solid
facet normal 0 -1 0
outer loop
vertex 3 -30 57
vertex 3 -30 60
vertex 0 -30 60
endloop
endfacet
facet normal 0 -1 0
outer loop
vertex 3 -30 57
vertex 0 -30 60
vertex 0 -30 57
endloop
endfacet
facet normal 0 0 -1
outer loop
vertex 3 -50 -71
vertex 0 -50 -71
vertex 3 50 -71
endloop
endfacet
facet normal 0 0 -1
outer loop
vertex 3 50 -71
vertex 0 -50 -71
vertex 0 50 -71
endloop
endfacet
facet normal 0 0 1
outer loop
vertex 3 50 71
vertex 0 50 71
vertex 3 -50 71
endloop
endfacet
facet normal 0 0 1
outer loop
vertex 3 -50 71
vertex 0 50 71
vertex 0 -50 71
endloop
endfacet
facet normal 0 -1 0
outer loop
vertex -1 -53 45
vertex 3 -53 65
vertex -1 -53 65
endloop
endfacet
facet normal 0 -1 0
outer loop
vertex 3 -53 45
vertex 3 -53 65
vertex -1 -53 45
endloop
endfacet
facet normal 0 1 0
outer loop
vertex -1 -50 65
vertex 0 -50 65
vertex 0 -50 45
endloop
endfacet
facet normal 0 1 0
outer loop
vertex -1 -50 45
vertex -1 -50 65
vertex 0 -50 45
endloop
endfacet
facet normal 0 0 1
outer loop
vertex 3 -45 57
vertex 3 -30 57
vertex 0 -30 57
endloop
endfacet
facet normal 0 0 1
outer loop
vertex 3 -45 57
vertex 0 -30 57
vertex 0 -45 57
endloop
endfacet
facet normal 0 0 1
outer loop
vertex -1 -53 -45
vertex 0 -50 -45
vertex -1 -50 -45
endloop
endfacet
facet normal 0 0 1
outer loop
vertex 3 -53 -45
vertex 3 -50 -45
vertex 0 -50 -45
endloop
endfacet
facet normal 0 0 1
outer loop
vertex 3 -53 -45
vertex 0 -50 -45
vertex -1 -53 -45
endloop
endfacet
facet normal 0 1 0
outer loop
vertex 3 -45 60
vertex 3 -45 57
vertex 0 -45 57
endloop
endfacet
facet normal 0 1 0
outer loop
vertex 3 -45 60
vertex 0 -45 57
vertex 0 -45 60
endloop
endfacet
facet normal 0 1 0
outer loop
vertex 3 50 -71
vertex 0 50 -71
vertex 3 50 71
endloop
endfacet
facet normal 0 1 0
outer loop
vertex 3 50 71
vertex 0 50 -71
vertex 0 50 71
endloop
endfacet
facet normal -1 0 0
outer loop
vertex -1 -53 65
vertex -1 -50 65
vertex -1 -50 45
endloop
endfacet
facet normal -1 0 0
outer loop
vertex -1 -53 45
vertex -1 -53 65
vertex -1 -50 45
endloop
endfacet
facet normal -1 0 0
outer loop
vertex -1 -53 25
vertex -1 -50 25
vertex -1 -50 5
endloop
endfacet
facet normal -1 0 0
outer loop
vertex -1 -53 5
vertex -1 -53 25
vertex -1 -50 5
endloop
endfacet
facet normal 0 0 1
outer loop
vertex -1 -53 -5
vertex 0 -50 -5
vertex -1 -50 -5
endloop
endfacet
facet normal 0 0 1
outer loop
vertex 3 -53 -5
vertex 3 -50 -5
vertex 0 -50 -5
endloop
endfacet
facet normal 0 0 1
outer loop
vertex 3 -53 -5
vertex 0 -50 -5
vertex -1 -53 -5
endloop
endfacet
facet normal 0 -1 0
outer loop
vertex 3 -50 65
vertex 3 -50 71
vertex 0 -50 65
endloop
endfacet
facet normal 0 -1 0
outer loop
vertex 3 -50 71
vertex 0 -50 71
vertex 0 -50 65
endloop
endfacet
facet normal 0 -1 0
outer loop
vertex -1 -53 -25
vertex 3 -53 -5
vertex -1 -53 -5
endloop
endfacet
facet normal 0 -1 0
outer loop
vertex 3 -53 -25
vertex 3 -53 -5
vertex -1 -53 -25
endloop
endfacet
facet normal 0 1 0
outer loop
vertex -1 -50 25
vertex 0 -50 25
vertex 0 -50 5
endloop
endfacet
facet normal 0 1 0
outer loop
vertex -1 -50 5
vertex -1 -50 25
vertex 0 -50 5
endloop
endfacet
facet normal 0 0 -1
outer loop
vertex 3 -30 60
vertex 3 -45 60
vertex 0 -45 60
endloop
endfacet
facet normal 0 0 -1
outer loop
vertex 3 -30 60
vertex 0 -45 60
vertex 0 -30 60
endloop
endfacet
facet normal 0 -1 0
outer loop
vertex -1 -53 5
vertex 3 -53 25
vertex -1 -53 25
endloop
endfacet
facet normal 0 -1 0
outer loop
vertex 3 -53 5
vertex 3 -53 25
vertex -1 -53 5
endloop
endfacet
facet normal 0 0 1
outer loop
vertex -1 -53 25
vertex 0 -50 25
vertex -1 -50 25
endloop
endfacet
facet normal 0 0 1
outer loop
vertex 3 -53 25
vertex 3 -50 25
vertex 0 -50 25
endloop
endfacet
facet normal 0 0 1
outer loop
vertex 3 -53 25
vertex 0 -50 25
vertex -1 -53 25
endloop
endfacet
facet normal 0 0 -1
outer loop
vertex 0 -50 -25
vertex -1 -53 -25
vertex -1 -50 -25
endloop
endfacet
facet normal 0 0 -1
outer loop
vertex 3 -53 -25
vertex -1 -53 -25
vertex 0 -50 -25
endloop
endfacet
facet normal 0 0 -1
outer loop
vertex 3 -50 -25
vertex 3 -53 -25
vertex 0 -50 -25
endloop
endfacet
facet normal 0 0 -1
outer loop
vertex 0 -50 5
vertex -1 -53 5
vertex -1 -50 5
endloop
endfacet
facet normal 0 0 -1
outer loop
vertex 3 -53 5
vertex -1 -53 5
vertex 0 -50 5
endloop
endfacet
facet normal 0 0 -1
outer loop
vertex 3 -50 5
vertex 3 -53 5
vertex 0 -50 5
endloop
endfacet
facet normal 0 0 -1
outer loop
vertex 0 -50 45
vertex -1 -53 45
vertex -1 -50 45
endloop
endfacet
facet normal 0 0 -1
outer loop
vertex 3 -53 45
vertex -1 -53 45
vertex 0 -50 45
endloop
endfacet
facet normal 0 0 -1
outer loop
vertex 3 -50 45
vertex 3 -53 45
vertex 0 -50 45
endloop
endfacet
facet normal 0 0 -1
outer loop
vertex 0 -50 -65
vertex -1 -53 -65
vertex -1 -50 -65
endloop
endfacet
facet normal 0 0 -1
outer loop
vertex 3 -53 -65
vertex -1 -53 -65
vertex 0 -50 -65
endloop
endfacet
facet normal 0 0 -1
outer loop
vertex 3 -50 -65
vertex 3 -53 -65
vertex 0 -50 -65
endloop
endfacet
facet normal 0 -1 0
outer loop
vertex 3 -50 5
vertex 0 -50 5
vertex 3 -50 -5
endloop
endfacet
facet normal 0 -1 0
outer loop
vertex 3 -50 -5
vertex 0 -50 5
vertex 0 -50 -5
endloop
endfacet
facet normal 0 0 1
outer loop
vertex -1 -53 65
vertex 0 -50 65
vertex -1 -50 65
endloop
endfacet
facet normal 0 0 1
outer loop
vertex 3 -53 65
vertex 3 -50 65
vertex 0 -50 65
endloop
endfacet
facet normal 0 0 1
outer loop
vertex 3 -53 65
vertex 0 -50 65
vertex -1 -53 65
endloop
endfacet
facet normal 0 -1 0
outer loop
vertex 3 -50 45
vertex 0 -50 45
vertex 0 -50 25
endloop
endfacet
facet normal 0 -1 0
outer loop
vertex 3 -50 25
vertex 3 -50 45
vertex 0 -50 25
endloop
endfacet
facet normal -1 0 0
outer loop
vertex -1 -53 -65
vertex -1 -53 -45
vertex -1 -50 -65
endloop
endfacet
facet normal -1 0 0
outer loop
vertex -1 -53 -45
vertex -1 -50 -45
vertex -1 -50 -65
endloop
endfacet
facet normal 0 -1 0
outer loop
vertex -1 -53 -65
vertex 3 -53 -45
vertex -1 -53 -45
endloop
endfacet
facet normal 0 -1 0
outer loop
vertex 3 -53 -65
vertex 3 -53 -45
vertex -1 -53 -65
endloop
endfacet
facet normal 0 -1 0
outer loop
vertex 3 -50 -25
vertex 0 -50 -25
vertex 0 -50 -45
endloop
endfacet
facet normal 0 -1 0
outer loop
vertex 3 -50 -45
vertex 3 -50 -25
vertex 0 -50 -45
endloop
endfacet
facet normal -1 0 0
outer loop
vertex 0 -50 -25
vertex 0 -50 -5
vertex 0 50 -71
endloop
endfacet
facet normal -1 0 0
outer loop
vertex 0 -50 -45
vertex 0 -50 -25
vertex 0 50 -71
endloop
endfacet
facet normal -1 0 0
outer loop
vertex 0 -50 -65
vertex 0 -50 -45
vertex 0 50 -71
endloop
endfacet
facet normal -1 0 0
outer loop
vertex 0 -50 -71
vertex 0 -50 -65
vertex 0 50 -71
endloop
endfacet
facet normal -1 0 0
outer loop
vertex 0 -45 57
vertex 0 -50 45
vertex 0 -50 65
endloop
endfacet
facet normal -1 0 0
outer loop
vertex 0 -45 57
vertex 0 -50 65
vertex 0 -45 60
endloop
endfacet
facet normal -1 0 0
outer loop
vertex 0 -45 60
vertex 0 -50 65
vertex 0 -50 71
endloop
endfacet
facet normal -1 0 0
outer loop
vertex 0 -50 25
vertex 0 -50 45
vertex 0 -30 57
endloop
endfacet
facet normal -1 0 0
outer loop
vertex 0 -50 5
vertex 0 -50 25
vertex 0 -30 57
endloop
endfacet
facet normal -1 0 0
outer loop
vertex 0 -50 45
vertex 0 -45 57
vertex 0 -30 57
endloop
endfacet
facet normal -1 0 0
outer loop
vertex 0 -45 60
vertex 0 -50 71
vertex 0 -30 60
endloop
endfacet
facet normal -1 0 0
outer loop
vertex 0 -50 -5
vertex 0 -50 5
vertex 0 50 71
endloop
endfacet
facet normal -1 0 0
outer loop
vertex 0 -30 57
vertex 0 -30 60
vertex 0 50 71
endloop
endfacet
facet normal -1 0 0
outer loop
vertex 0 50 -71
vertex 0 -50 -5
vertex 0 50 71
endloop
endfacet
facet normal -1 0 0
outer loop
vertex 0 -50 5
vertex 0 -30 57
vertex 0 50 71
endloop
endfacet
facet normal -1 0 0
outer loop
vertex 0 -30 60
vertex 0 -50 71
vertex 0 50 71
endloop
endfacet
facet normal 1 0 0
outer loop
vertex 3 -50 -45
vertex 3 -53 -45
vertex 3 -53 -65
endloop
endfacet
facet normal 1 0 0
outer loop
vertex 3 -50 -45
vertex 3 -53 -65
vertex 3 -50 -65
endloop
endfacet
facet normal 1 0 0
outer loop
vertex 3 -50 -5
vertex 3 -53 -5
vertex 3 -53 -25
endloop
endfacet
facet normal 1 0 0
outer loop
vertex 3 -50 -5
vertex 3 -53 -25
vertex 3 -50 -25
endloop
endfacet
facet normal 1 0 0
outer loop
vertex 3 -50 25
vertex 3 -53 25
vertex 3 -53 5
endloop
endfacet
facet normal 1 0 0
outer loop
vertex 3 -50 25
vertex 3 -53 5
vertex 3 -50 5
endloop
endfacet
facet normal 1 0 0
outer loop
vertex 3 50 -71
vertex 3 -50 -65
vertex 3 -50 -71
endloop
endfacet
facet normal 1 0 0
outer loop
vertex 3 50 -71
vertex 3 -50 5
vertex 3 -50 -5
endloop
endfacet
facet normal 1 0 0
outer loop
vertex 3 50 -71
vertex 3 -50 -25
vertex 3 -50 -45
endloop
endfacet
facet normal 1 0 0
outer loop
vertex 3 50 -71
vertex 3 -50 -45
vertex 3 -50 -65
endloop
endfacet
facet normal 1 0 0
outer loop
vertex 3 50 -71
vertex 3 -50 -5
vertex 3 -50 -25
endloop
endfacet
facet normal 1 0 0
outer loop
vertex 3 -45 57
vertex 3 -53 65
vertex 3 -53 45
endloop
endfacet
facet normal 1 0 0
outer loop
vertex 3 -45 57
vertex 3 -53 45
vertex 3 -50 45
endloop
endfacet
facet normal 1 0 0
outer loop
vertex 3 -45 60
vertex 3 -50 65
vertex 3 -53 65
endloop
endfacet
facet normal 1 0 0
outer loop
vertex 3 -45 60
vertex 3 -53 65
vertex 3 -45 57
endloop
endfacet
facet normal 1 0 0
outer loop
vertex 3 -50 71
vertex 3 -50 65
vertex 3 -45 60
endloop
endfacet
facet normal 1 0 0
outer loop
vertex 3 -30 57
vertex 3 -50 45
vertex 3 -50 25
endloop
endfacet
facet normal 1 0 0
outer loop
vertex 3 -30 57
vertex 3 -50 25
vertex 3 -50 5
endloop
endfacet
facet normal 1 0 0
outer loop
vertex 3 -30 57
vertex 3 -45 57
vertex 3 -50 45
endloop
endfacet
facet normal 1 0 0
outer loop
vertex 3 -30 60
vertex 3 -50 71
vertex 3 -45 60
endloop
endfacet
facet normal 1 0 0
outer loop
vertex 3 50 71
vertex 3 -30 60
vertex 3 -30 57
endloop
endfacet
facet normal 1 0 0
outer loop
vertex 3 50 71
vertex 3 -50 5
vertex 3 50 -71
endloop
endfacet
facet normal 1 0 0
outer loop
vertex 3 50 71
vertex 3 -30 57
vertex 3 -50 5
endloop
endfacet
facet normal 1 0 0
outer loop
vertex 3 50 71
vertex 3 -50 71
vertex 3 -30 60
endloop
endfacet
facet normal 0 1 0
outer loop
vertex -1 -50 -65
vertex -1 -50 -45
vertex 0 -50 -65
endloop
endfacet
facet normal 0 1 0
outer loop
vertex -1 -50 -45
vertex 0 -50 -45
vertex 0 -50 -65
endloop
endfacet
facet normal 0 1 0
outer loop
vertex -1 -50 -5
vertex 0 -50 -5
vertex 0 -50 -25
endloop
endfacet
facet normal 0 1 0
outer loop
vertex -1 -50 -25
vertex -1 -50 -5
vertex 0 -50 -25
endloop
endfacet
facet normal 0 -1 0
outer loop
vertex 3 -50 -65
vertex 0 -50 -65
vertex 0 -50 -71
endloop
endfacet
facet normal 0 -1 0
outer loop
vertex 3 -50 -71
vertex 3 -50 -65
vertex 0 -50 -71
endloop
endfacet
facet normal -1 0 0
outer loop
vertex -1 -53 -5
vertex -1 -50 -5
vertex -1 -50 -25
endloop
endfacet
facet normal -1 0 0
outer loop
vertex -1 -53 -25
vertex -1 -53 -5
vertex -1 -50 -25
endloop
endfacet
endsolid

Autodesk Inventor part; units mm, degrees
ref_plane "YZ Plane" through (0, 0, 0) normal (1, 0, 0) x (0, 1, 0)
ref_plane "XZ Plane" through (0, 0, 0) normal (0, 1, 0) x (-1, 0, 0)
ref_plane "XY Plane" through (0, 0, 0) normal (0, 0, 1) x (1, 0, 0)
sketch "Sketch1" plane through (0, 0, 0) normal (1, 0, 0) x (0, 1, 0)
  line L0 (-50, -71) -> (50, -71)
  line L1 (50, -71) -> (50, 71)
  line L2 (50, 71) -> (-50, 71)
  line L3 (-50, 71) -> (-50, -71)
  line L4 (-50, -71) -> (50, 71) construction
  line L5 (50, -71) -> (-50, 71) construction
  point P0 (0, 0)
  dimension "d0" = 100
  dimension "d1" = 142
extrude "Extrusion1" add sketch "Sketch1" along normal blind 3
sketch "Sketch2" plane through (3, 0, 0) normal (1, 0, 0) x (0, 0, -1)
  line L0 (-71, -50) -> (71, -50) projected
  line L1 (-5, -50) -> (-25, -50)
  line L2 (-25, -50) -> (-25, -53)
  line L3 (-25, -53) -> (-5, -53)
  line L4 (-5, -53) -> (-5, -50)
  line L5 (-45, -50) -> (-65, -50)
  line L6 (-65, -50) -> (-65, -53)
  line L7 (-65, -53) -> (-45, -53)
  line L8 (-45, -53) -> (-45, -50)
  point P0 (0, 0)
  dimension "d4" = 20
  dimension "d5" = 3
  dimension "d6" = 5
  dimension "d7" = 20
  dimension "d8" = 3
  dimension "d9" = 20
extrude "Extrusion2" add sketch "Sketch2" against normal blind 4
mirror "Mirror1" about plane through (0, 0, 0) normal (0, 0, 1) of "Extrusion2"
sketch "Sketch3" plane through (3, 0, 0) normal (1, 0, 0) x (0, 0, -1)
  line L0 (-60, -30) -> (-57, -30)
  line L1 (-57, -30) -> (-57, -45)
  line L2 (-57, -45) -> (-60, -45)
  line L3 (-60, -45) -> (-60, -30)
  line L4 (-71, -50) -> (-65, -50) projected
  point P0 (0, 0)
  dimension "d12" = 3
  dimension "d13" = 15
  dimension "d14" = 57
  dimension "d15" = 5
extrude "Extrusion3" cut sketch "Sketch3" against normal blind 4
properties part number "frount plate"
